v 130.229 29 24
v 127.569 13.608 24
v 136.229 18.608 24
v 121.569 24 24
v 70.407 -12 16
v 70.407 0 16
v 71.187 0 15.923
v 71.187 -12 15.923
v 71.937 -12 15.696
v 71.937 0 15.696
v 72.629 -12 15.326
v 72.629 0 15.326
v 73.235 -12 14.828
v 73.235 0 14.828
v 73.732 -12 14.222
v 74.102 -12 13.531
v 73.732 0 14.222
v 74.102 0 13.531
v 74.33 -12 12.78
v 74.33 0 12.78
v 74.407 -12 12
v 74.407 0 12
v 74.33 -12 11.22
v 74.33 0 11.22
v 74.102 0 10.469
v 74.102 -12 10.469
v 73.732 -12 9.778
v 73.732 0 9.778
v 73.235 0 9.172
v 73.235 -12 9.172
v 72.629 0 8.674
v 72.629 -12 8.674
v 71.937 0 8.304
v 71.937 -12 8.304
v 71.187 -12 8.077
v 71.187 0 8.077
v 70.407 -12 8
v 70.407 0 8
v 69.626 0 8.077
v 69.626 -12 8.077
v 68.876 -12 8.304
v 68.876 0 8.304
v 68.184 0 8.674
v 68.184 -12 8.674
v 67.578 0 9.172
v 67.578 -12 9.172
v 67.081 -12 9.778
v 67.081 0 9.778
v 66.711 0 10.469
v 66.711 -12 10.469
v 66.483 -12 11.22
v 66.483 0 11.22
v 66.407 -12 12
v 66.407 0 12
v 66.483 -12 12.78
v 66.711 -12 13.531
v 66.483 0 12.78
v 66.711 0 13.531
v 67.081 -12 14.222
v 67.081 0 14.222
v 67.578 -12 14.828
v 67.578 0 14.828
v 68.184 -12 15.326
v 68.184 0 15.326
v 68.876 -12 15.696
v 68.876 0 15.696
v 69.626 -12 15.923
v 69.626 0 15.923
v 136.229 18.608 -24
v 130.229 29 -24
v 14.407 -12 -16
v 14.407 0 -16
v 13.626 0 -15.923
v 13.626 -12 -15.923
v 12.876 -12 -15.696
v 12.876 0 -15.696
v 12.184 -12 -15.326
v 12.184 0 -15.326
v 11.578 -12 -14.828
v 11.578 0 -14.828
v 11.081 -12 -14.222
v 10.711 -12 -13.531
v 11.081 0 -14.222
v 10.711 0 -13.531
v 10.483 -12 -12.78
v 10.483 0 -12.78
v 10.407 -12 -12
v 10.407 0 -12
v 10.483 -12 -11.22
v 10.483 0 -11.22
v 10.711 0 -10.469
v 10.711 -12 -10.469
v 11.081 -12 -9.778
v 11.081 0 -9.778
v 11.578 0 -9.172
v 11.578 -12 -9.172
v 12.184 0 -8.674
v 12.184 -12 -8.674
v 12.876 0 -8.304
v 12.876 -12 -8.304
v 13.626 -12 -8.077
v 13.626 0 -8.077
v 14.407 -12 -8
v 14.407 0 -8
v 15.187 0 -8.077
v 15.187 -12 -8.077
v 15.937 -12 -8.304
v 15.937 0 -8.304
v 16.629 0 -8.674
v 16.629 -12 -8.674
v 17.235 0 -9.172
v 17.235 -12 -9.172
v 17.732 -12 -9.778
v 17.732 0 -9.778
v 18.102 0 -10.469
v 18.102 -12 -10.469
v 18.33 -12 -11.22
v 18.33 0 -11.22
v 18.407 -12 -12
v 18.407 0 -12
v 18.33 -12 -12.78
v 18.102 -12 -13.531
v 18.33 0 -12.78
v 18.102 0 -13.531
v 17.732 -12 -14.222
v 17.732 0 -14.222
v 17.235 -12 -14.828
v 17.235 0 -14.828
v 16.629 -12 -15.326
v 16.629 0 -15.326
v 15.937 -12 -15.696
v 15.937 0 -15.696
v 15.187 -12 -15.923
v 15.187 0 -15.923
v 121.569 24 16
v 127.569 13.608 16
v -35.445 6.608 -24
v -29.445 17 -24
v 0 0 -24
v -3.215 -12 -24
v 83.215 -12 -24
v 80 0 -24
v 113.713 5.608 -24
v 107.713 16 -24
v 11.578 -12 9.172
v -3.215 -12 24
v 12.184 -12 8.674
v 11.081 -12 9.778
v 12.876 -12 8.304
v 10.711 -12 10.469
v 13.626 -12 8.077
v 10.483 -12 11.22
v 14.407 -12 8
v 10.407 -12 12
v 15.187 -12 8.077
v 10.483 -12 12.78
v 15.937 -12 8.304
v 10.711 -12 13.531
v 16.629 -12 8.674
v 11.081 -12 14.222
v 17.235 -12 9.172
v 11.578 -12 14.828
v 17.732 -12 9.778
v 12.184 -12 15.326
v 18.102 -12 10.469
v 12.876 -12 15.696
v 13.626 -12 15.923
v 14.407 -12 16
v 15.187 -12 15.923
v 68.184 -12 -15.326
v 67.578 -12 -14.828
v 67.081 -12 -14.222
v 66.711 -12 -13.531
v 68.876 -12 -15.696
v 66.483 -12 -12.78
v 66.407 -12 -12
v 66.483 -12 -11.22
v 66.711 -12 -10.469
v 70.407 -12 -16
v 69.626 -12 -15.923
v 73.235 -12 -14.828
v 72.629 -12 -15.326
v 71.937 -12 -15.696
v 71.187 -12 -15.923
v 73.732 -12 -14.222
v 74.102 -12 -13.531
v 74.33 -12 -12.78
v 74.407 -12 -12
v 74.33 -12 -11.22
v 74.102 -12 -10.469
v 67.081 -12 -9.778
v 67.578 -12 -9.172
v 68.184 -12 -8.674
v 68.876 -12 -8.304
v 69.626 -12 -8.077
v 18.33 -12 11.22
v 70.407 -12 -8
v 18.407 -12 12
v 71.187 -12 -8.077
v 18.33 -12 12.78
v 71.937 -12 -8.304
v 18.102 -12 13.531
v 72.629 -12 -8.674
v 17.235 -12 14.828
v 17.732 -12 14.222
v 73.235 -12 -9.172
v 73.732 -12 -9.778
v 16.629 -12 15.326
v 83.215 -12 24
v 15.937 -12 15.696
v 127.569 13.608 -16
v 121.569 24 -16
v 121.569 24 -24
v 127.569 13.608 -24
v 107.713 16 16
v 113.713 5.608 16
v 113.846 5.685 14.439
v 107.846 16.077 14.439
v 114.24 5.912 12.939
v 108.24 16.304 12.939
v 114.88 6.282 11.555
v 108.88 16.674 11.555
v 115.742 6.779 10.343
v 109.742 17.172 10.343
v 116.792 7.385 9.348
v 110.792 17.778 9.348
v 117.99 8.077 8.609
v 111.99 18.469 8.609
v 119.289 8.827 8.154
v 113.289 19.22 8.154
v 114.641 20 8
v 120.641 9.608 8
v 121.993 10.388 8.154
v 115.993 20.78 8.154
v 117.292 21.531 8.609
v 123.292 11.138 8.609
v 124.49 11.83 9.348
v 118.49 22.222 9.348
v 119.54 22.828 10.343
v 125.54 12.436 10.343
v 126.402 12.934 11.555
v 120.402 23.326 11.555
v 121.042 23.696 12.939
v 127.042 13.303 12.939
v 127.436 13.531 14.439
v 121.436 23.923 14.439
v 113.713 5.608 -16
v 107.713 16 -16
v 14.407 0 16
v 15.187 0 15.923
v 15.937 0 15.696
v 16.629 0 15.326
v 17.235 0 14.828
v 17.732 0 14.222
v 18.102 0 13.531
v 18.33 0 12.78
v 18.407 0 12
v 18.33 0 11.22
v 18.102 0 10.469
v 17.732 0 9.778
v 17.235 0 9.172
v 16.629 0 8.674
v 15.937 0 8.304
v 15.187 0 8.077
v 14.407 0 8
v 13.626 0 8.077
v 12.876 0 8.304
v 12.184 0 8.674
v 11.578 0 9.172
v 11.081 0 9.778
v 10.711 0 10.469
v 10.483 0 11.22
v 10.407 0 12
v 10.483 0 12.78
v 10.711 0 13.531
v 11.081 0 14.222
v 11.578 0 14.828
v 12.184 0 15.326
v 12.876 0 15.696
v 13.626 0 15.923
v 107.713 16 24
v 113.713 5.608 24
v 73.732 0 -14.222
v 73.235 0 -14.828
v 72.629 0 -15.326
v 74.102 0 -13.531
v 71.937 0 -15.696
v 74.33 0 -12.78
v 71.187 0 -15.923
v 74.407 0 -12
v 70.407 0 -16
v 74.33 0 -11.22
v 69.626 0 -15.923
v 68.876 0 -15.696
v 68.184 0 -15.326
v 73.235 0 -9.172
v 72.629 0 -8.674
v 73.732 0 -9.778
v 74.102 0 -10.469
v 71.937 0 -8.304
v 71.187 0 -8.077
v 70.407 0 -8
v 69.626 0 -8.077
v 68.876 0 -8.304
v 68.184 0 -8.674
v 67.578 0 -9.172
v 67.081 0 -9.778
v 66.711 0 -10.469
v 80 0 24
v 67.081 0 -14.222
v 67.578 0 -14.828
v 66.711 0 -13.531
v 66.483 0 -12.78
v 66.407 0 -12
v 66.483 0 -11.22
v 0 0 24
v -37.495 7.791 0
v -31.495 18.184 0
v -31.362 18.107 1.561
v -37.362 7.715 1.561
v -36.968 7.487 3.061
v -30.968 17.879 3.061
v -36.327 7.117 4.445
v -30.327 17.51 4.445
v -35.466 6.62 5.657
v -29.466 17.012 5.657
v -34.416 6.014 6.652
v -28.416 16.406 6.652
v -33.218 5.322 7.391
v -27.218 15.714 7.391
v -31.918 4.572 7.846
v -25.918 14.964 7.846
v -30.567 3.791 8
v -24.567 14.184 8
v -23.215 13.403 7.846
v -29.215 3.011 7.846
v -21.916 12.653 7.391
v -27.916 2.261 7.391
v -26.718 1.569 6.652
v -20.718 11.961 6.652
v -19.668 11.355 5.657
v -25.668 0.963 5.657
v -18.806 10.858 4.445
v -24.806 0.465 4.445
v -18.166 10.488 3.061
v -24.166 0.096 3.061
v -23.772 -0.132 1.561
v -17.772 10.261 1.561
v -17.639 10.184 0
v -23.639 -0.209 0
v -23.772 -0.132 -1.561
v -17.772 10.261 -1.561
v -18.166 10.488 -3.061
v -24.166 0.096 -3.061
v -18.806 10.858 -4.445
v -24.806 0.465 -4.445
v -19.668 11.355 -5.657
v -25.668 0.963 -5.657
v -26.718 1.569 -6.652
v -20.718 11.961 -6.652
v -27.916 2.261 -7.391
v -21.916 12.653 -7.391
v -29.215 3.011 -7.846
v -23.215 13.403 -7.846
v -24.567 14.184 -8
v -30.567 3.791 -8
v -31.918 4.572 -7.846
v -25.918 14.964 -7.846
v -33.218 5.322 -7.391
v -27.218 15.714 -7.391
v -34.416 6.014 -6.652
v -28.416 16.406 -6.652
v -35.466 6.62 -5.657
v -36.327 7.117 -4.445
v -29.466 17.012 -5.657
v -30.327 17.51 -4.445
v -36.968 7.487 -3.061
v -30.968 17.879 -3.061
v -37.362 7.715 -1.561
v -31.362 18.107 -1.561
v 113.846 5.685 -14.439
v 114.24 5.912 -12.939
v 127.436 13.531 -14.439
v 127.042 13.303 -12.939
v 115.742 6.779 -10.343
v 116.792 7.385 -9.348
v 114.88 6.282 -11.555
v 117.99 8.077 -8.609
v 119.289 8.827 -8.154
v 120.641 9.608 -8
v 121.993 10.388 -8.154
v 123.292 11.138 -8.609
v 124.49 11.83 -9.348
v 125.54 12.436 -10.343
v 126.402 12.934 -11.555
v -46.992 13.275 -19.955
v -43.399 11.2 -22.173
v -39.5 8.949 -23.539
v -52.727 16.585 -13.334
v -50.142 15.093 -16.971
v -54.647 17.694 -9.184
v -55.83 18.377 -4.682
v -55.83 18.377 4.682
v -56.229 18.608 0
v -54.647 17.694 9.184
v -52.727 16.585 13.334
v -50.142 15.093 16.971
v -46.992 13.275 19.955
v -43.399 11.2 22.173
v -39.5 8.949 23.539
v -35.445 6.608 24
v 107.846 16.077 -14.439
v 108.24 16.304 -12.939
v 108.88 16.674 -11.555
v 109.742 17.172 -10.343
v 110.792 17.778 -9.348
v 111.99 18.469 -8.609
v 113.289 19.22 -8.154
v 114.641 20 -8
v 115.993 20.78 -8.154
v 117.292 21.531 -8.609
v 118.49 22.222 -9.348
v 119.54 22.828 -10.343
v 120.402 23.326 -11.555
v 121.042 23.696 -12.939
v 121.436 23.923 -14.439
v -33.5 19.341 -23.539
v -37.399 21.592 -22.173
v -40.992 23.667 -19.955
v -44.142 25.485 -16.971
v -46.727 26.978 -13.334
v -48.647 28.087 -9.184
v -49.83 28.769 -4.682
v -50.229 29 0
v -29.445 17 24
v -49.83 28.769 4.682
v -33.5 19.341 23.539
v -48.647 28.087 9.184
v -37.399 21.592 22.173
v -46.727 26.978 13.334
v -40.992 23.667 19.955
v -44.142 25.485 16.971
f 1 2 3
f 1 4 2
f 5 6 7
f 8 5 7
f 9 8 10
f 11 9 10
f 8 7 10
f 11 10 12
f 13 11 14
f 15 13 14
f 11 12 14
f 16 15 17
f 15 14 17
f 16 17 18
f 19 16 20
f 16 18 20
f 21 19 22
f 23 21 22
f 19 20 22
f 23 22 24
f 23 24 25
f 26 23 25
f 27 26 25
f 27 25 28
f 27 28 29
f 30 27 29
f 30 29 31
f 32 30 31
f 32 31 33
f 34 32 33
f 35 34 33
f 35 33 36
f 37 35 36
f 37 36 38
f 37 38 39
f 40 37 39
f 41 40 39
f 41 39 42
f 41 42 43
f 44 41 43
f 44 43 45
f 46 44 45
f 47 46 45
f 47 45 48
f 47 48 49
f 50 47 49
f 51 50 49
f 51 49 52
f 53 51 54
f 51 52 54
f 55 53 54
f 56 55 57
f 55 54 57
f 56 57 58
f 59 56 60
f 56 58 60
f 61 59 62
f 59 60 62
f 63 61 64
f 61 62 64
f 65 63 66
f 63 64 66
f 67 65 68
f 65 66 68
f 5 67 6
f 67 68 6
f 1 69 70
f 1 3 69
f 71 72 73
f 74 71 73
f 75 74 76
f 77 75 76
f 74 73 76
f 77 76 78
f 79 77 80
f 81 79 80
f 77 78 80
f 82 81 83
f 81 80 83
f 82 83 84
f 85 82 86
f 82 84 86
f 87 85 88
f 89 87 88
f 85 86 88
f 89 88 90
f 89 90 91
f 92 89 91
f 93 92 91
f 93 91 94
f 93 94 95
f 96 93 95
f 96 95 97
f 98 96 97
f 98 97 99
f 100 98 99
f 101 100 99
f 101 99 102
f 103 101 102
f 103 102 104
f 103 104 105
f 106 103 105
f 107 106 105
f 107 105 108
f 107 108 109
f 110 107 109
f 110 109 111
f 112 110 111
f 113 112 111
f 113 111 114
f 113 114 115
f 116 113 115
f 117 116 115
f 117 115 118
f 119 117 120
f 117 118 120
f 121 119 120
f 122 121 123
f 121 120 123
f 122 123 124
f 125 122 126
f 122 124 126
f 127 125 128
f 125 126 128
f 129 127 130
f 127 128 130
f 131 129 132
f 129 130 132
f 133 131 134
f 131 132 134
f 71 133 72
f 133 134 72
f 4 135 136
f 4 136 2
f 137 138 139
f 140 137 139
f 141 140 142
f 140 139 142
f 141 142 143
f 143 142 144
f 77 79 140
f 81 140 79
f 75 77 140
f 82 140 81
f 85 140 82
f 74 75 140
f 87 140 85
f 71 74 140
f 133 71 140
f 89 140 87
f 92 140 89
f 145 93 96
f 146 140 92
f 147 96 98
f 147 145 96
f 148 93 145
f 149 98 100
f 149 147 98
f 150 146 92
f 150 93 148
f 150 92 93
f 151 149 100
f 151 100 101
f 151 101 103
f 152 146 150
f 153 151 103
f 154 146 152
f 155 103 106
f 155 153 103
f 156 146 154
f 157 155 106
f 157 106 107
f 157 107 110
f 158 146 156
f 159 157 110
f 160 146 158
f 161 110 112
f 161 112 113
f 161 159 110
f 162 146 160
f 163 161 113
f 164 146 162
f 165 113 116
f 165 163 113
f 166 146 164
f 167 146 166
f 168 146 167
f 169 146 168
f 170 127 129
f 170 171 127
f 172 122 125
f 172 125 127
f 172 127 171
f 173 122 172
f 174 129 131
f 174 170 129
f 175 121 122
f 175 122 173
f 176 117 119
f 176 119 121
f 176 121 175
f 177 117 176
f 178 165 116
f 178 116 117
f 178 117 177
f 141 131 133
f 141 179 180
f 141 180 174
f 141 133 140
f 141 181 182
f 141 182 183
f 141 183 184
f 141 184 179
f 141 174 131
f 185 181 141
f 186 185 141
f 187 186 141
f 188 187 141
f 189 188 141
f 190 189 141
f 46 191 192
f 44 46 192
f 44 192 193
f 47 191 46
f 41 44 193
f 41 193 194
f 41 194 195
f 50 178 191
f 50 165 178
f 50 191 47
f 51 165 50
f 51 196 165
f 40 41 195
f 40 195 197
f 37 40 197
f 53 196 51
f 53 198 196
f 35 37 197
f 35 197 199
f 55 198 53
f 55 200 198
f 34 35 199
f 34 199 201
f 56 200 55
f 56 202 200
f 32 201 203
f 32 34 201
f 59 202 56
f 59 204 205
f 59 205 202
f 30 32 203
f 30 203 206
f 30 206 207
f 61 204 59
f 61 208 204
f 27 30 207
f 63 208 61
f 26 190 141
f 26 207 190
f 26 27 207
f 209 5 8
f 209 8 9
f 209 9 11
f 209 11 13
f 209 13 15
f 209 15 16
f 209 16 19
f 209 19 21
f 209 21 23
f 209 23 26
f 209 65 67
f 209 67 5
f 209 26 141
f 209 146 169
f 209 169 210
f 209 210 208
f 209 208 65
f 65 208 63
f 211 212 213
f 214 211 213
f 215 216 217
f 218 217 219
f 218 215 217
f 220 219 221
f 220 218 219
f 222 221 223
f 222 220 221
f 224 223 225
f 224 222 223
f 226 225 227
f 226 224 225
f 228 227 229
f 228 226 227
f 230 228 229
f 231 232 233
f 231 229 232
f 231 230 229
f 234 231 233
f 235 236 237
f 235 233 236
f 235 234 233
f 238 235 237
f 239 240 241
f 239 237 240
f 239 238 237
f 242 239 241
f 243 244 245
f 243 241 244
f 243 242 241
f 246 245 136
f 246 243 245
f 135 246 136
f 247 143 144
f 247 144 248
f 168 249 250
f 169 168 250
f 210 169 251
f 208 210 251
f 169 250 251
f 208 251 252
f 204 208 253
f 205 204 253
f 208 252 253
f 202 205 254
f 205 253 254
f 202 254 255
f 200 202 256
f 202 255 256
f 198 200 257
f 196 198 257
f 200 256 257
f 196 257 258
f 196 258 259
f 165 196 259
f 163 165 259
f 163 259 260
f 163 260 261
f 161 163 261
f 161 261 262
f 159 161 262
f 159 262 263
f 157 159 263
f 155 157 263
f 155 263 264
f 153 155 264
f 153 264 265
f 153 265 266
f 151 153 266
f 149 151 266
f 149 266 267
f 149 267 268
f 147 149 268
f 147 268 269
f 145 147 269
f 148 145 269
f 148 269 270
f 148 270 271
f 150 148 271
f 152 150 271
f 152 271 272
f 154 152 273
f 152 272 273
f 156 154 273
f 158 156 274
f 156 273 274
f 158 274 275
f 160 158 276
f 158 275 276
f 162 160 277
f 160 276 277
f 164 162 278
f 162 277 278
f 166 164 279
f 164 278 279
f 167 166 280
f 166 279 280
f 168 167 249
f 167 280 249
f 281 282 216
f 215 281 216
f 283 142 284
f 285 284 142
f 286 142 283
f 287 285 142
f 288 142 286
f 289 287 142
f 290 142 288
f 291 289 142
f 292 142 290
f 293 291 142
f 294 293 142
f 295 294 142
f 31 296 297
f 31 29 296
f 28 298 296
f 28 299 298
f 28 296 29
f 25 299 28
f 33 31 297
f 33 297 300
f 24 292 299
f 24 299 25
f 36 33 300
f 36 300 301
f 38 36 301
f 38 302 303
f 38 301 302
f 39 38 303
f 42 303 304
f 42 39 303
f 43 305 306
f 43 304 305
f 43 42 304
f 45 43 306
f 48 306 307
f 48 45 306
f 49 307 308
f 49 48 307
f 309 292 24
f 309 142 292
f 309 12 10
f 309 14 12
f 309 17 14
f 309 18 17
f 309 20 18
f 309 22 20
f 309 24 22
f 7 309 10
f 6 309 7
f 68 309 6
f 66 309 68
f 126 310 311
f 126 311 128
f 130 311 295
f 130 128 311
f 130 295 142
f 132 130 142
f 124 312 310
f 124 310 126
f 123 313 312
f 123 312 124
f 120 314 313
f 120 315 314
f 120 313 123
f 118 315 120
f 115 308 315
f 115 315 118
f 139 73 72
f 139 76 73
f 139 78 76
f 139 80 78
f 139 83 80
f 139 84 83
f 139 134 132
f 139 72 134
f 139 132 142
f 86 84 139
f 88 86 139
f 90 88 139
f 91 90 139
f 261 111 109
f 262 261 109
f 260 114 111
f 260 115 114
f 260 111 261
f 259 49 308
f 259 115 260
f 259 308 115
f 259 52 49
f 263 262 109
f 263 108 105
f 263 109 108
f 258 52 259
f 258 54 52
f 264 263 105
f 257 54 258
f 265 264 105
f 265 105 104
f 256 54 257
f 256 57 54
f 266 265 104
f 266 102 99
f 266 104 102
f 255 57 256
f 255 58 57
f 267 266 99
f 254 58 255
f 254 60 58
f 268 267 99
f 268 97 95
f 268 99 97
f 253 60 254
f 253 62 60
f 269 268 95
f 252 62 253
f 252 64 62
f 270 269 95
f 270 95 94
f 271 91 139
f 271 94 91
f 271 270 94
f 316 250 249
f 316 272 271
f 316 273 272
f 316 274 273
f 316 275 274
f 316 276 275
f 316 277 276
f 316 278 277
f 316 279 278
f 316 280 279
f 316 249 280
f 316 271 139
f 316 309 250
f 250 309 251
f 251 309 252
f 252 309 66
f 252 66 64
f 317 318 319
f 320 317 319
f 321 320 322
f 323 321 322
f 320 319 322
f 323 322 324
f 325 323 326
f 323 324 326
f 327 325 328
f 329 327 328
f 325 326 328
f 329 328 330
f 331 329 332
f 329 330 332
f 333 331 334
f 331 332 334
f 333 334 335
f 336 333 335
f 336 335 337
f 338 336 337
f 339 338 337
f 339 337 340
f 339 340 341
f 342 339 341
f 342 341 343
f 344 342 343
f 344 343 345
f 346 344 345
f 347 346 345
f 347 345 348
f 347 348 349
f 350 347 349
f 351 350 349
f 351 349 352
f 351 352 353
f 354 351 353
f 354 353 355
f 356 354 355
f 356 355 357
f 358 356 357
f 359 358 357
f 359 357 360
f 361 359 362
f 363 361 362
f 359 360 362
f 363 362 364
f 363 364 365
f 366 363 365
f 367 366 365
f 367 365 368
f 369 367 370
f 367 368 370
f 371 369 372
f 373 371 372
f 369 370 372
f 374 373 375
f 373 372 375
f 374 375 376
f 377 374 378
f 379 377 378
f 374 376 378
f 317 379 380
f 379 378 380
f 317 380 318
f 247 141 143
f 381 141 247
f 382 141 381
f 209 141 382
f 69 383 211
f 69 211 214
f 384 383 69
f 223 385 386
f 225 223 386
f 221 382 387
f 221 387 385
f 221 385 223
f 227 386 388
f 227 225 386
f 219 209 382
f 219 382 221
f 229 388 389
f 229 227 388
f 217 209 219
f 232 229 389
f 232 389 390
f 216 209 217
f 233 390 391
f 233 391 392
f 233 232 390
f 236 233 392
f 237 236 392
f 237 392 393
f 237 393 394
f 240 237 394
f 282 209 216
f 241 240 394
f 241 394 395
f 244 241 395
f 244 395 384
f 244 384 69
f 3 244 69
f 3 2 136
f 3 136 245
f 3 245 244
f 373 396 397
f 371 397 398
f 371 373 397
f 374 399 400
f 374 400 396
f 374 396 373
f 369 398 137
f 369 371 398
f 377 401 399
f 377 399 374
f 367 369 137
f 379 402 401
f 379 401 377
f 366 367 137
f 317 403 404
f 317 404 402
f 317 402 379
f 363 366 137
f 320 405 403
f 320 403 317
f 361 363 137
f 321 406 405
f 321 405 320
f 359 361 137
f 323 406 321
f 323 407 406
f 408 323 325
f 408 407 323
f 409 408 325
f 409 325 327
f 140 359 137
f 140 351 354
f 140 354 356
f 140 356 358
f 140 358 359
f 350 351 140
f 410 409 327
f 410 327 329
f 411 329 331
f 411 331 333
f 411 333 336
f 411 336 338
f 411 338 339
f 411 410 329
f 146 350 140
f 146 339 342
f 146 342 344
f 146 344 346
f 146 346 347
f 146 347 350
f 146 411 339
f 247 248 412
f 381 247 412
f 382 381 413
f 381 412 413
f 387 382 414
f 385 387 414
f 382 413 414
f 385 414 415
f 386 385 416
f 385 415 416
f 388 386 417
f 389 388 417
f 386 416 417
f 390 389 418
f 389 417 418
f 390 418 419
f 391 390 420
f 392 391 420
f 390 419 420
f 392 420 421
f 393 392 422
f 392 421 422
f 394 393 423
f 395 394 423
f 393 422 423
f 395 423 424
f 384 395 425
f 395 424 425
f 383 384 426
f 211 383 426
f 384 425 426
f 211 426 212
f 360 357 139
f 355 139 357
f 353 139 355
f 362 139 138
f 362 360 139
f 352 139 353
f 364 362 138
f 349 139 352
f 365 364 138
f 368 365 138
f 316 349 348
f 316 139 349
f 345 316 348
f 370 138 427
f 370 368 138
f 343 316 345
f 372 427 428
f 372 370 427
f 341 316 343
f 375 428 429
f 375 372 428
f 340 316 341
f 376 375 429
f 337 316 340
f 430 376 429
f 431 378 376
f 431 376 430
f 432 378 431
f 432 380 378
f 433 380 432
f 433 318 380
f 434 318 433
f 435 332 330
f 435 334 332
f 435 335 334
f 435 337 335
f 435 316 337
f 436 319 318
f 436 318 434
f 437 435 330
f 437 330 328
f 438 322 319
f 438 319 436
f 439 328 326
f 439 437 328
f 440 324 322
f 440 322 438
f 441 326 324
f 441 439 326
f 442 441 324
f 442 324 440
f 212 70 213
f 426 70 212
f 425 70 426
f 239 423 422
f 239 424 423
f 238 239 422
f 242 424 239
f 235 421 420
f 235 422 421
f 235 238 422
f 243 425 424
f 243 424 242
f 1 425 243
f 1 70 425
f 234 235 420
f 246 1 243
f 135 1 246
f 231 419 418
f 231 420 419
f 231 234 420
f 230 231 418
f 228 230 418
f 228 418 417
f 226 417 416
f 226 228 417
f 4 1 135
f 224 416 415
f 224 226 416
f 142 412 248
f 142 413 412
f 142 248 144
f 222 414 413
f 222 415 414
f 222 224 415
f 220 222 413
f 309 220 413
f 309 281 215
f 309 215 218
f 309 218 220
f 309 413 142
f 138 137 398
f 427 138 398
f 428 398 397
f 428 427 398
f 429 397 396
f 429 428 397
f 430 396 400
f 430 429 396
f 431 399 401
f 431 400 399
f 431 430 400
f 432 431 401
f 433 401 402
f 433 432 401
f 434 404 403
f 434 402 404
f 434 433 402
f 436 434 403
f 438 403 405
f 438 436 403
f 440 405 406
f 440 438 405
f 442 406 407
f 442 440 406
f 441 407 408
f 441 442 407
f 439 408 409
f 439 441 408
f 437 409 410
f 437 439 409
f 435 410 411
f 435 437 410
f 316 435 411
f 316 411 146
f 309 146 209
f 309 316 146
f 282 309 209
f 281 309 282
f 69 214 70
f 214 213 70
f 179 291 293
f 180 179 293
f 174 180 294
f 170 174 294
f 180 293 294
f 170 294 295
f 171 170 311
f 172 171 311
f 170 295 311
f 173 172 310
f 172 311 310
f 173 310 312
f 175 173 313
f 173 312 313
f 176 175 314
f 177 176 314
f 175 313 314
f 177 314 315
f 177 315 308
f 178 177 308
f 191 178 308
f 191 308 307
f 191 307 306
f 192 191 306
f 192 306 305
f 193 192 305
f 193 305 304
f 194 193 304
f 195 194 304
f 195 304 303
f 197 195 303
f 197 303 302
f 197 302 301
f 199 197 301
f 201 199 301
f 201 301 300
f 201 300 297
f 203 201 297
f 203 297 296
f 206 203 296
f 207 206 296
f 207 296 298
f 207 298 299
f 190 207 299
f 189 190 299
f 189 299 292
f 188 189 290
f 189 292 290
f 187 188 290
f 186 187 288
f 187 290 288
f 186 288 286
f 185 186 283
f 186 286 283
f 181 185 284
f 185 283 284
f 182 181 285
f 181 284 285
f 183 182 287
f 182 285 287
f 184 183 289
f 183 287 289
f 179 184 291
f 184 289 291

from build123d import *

# Parameters (mm, degrees)
EXTRUDE_1_DEPTH     = 24
FILLET_1_RADIUS     = 24
FILLET_1_LENGTH     = 12
SKETCH_3_R          = 8
CUT_EXTRUDE_2_DEPTH = 142.334600959
SKETCH_4_R          = 4
CUT_EXTRUDE_3_DEPTH = 142.334600959
CUT_EXTRUDE_4_DEPTH = 135.667997045


with BuildPart() as part:
    # 草圖1 → 伸長-薄件1 (new, symmetric)
    with BuildSketch(Plane.XY):
        Polygon((130.229473419, 29), (80, 0), (0, 0), (-50.229473419, 29), (-56.229473419, 18.607695155), (-3.215390309, -12), (83.215390309, -12), (136.229473419, 18.607695155), align=None)
    extrude(amount=EXTRUDE_1_DEPTH, both=True)

    # 圓角1: full round fillet: the end face becomes a half cylinder, R = half its width
    fillet_1_face = Plane((-53.229473419, 23.803847577, 0), x_dir=(0.5, 0.866025403784, 0), z_dir=(-0.866025403784, 0.5, 0))  # on the end face: x along it, z out of the body
    fillet_1_slab = fillet_1_face.offset(-FILLET_1_RADIUS / 2) * Box(FILLET_1_LENGTH, 2 * FILLET_1_RADIUS, FILLET_1_RADIUS, mode=Mode.PRIVATE)  # the body's end, R deep
    fillet_1_round = Plane((-32.444863728, 11.803847577, 0), x_dir=(-0.866025403784, 0.5, 0), z_dir=(0.5, 0.866025403784, 0)) * Cylinder(FILLET_1_RADIUS, FILLET_1_LENGTH, mode=Mode.PRIVATE)  # its axis R under the face
    add(fillet_1_slab - fillet_1_round, mode=Mode.SUBTRACT)

    # 草圖3 → 除料-伸長2 (cut, through all)
    with BuildSketch(Plane(origin=(0, 0, 0), x_dir=(0.8660254037844416, -0.49999999999999484, 0), z_dir=(0.49999999999999484, 0.8660254037844416, 0))):
        with Locations(Location((-28.36733721, 0, 0), (0, 0, 180))):
            Circle(SKETCH_3_R)
    extrude(amount=-CUT_EXTRUDE_2_DEPTH, mode=Mode.SUBTRACT)

    # 草圖4 → 除料-伸長3 (cut, through all)
    with BuildSketch(Plane(origin=(0, 0, 0), x_dir=(1, 0, 0), z_dir=(0, 1, 0))):
        with Locations(Location((14.406554247, -12, 0), (0, 0, 270))):
            Circle(SKETCH_4_R)
        with Locations(Location((70.406554247, -12, 0), (0, 0, 270))):
            Circle(SKETCH_4_R)
        with Locations(Location((70.406554247, 12, 0), (0, 0, 90))):
            Circle(SKETCH_4_R)
        with Locations(Location((14.406554247, 12, 0), (0, 0, 90))):
            Circle(SKETCH_4_R)
    extrude(amount=-CUT_EXTRUDE_3_DEPTH, mode=Mode.SUBTRACT)

    # 草圖5 → 除料-伸長4 (cut, through all)
    with BuildSketch(Plane(origin=(20, -34.641016151, 0), x_dir=(0.866025403784438, 0.500000000000001, 0), z_dir=(-0.500000000000001, 0.866025403784438, 0))):
        with BuildLine():
            Line((101.282032303, -24), (101.282032303, -16))
            ThreePointArc((101.282032303, -16), (109.282032303, -8), (117.282032303, -16))
            Line((117.282032303, -16), (117.282032303, -24))
            Line((117.282032303, -24), (101.282032303, -24))
        make_face()
        with BuildLine():
            Line((117.282032303, 24), (101.282032303, 24))
            Line((101.282032303, 24), (101.282032303, 16))
            ThreePointArc((101.282032303, 16), (109.282032303, 8), (117.282032303, 16))
            Line((117.282032303, 16), (117.282032303, 24))
        make_face()
    extrude(amount=-CUT_EXTRUDE_4_DEPTH, mode=Mode.SUBTRACT)


solid = part.part
